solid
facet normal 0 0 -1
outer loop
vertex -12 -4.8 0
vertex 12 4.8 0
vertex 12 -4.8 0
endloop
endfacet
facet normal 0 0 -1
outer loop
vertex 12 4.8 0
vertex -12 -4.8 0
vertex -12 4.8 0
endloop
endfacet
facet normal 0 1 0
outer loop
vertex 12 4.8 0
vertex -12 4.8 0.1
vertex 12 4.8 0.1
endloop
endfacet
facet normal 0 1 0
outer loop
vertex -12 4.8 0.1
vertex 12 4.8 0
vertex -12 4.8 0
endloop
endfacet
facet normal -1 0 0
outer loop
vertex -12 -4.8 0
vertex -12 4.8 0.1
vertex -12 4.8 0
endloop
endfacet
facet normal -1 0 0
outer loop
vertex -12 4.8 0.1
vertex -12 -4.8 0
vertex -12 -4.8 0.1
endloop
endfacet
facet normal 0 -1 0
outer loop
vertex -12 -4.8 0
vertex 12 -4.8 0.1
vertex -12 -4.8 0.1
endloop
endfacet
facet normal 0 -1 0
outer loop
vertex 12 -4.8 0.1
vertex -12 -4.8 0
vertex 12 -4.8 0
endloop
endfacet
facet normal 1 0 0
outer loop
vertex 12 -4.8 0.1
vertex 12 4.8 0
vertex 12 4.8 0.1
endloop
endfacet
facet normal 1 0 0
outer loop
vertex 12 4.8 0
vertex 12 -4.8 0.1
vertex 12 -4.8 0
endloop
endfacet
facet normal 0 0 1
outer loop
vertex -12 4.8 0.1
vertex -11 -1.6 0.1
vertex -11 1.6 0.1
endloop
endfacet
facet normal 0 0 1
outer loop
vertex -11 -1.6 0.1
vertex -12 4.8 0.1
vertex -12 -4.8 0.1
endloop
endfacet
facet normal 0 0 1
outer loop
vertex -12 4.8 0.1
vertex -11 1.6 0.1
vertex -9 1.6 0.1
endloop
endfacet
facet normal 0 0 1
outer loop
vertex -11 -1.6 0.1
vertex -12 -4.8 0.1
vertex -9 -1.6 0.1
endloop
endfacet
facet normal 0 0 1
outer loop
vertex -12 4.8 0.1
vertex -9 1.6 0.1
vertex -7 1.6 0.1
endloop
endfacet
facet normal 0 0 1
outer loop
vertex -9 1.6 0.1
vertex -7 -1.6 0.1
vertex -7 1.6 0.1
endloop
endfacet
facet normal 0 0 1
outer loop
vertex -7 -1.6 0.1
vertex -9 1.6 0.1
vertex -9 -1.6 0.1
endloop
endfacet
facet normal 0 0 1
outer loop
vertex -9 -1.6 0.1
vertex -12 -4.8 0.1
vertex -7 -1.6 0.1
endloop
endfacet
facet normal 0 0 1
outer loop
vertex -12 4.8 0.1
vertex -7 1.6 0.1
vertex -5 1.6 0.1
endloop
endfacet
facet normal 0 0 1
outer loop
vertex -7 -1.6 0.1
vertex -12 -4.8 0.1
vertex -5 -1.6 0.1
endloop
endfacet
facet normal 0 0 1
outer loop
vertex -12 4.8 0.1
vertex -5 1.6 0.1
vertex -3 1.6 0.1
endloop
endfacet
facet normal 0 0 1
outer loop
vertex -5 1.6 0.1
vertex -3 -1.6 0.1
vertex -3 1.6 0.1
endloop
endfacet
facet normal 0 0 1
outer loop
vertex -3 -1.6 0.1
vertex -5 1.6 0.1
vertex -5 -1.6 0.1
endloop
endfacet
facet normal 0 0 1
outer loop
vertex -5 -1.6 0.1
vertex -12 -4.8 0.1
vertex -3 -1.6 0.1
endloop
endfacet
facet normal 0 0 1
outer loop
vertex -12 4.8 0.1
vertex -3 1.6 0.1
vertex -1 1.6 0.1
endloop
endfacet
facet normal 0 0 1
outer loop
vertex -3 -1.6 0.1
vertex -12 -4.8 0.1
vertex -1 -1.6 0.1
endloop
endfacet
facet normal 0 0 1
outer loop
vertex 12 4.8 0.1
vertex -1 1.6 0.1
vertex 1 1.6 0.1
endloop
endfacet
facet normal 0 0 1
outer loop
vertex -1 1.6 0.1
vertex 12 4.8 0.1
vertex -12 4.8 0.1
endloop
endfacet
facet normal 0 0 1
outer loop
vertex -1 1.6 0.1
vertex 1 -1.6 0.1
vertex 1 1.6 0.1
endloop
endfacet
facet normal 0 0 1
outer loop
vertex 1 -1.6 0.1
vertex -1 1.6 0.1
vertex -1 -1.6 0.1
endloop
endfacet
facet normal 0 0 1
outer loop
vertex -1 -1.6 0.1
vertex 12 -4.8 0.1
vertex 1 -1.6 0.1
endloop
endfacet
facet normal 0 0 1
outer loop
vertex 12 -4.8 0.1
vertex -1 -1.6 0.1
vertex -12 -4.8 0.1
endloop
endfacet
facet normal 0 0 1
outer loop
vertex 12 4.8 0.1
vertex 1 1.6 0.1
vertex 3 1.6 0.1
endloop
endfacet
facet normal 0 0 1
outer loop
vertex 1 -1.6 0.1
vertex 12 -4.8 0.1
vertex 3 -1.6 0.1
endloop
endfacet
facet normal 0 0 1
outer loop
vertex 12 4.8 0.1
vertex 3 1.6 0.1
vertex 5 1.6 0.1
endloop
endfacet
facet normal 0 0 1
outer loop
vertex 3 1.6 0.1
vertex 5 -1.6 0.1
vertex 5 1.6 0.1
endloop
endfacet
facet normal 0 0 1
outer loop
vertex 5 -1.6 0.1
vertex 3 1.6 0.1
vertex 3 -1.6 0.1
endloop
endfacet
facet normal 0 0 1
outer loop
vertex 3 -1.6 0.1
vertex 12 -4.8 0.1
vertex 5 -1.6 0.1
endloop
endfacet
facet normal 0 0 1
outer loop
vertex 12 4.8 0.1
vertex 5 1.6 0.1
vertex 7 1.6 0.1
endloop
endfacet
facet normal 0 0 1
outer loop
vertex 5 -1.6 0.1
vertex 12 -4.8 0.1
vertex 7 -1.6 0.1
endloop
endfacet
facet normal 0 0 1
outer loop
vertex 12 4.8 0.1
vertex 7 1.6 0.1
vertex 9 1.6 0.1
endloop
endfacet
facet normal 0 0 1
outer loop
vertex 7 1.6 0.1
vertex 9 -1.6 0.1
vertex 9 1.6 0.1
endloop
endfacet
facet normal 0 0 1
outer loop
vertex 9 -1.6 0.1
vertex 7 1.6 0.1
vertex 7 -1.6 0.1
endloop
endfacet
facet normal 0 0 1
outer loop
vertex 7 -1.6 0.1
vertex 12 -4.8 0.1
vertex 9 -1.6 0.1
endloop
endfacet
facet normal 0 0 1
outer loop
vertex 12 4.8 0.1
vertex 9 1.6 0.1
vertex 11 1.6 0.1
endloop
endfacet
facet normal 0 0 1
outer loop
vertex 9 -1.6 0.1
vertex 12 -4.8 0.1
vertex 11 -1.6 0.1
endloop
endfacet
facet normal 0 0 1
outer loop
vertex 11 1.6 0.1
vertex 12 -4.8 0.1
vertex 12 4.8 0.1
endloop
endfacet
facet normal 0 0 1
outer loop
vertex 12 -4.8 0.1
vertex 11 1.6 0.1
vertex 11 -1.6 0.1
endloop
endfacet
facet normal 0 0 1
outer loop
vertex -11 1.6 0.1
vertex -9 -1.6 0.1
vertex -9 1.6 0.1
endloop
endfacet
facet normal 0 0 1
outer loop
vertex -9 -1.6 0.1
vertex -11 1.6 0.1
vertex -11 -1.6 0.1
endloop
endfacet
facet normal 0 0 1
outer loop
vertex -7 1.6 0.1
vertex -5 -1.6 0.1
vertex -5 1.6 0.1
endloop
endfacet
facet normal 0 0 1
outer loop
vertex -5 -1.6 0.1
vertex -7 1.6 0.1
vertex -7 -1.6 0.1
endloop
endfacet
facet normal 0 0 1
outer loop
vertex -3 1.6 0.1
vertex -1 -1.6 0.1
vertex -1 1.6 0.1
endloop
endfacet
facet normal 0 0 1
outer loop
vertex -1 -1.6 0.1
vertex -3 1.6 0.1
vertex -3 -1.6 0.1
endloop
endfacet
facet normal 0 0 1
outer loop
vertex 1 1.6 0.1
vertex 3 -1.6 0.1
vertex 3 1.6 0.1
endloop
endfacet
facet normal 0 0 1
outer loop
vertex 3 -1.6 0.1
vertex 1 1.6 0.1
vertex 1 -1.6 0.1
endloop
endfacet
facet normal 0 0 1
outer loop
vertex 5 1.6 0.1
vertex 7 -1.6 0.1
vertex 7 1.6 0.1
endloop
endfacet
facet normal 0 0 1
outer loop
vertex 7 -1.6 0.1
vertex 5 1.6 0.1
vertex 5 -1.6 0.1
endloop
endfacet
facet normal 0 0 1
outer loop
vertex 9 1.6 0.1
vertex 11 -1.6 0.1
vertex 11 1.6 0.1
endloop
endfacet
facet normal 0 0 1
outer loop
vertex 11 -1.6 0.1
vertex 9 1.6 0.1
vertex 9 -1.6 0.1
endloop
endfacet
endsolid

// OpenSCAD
// file: ../p/box5-12.scad
use <../lib.scad>
function ldraw_lib__box5_12() = [
// 0 Box with 5 Faces without Any Edges
// 0 Name: box5-12.dat
// 0 Author: Chris Dee [cwdee]
// 0 !LDRAW_ORG Primitive UPDATE 2009-02
// 0 !LICENSE Licensed under CC BY 4.0 : see CAreadme.txt
// 
// 0 BFC CERTIFY CCW
  [0,"BFC","CERTIFY"],
  [0,"BFC","CCW"],
// 
// 0 !HISTORY 2009-09-03 [PTadmin] Official Update 2009-02
// 
// 
// 4 16 1 1 1 1 1 -1 -1 1 -1 -1 1 1
  [4,16,1,1,1,1,1,-1,-1,1,-1,-1,1,1],
// 4 16 -1 0 1 1 0 1 1 1 1 -1 1 1
  [4,16,-1,0,1,1,0,1,1,1,1,-1,1,1],
// 4 16 -1 0 -1 -1 0 1 -1 1 1 -1 1 -1
  [4,16,-1,0,-1,-1,0,1,-1,1,1,-1,1,-1],
// 4 16 1 0 -1 -1 0 -1 -1 1 -1 1 1 -1
  [4,16,1,0,-1,-1,0,-1,-1,1,-1,1,1,-1],
// 4 16 1 0 1 1 0 -1 1 1 -1 1 1 1
  [4,16,1,0,1,1,0,-1,1,1,-1,1,1,1],
// 0
];
module ldraw_lib__box5_12(step=0, col=false, unit=2/5, alt=false, line=0.2, solid=!$preview)
    makepoly(ldraw_lib__box5_12(), step=step, col=col, unit=unit, alt=alt, line=line, solid=solid);
ldraw_lib__box5_12(line=0.2);
// main file
use <../lib.scad>
use <../p/box5-12.scad>
function ldraw_lib__191485o() = [
// 0 Sticker  1.2 x  3.0 with One Centred Row of Light Blue Squares
// 0 Name: 191485o.dat
// 0 Author: Rene Rechthaler [Blechtaler]
// 0 !LDRAW_ORG Part UPDATE 2024-03
// 0 !LICENSE Licensed under CC BY 4.0 : see CAreadme.txt
// 
// 0 BFC CERTIFY CCW
  [0,"BFC","CERTIFY"],
  [0,"BFC","CCW"],
// 
// 0 !KEYWORDS Bricklink 1554stk01, Brickowl 356438, ferry, Finland Steamship Co.
// 0 !KEYWORDS Rebrickable 191485, Set 1554, Silja
// 
// 0 !HISTORY 2023-10-21 [Blechtaler] fixed some t-junk and used MagFors color 0x237A1E8
// 0 !HISTORY 2024-04-01 [MagFors] Added a noclip
// 0 !HISTORY 2024-04-28 [OrionP] Official Update 2024-03
// 
// 1 16 0 -.25 0 30 0 0 0 .25 0 0 0 12 box5-12.dat
  [1,16,0,-.25,0,30,0,0,0,.25,0,0,0,12, ldraw_lib__box5_12()],
// 
// 4 16 -30 -.25 12 -30 -.25 -12 -27.5 -.25 -4 -27.5 -.25 4
  [4,16,-30,-.25,12,-30,-.25,-12,-27.5,-.25,-4,-27.5,-.25,4],
// 3 16 -30 -.25 12 -27.5 -.25 4 -22.5 -.25 4
  [3,16,-30,-.25,12,-27.5,-.25,4,-22.5,-.25,4],
// 3 16 -27.5 -.25 -4 -30 -.25 -12 -22.5 -.25 -4
  [3,16,-27.5,-.25,-4,-30,-.25,-12,-22.5,-.25,-4],
// 3 16 -30 -.25 12 -22.5 -.25 4 -17.5 -.25 4
  [3,16,-30,-.25,12,-22.5,-.25,4,-17.5,-.25,4],
// 4 16 -22.5 -.25 4 -22.5 -.25 -4 -17.5 -.25 -4 -17.5 -.25 4
  [4,16,-22.5,-.25,4,-22.5,-.25,-4,-17.5,-.25,-4,-17.5,-.25,4],
// 3 16 -22.5 -.25 -4 -30 -.25 -12 -17.5 -.25 -4
  [3,16,-22.5,-.25,-4,-30,-.25,-12,-17.5,-.25,-4],
// 3 16 -30 -.25 12 -17.5 -.25 4 -12.5 -.25 4
  [3,16,-30,-.25,12,-17.5,-.25,4,-12.5,-.25,4],
// 3 16 -17.5 -.25 -4 -30 -.25 -12 -12.5 -.25 -4
  [3,16,-17.5,-.25,-4,-30,-.25,-12,-12.5,-.25,-4],
// 3 16 -30 -.25 12 -12.5 -.25 4 -7.5 -.25 4
  [3,16,-30,-.25,12,-12.5,-.25,4,-7.5,-.25,4],
// 4 16 -12.5 -.25 4 -12.5 -.25 -4 -7.5 -.25 -4 -7.5 -.25 4
  [4,16,-12.5,-.25,4,-12.5,-.25,-4,-7.5,-.25,-4,-7.5,-.25,4],
// 3 16 -12.5 -.25 -4 -30 -.25 -12 -7.5 -.25 -4
  [3,16,-12.5,-.25,-4,-30,-.25,-12,-7.5,-.25,-4],
// 3 16 -30 -.25 12 -7.5 -.25 4 -2.5 -.25 4
  [3,16,-30,-.25,12,-7.5,-.25,4,-2.5,-.25,4],
// 3 16 -7.5 -.25 -4 -30 -.25 -12 -2.5 -.25 -4
  [3,16,-7.5,-.25,-4,-30,-.25,-12,-2.5,-.25,-4],
// 4 16 -30 -.25 12 -2.5 -.25 4 2.5 -.25 4 30 -.25 12
  [4,16,-30,-.25,12,-2.5,-.25,4,2.5,-.25,4,30,-.25,12],
// 4 16 -2.5 -.25 4 -2.5 -.25 -4 2.5 -.25 -4 2.5 -.25 4
  [4,16,-2.5,-.25,4,-2.5,-.25,-4,2.5,-.25,-4,2.5,-.25,4],
// 4 16 -2.5 -.25 -4 -30 -.25 -12 30 -.25 -12 2.5 -.25 -4
  [4,16,-2.5,-.25,-4,-30,-.25,-12,30,-.25,-12,2.5,-.25,-4],
// 3 16 30 -.25 12 2.5 -.25 4 7.5 -.25 4
  [3,16,30,-.25,12,2.5,-.25,4,7.5,-.25,4],
// 3 16 2.5 -.25 -4 30 -.25 -12 7.5 -.25 -4
  [3,16,2.5,-.25,-4,30,-.25,-12,7.5,-.25,-4],
// 3 16 30 -.25 12 7.5 -.25 4 12.5 -.25 4
  [3,16,30,-.25,12,7.5,-.25,4,12.5,-.25,4],
// 4 16 7.5 -.25 4 7.5 -.25 -4 12.5 -.25 -4 12.5 -.25 4
  [4,16,7.5,-.25,4,7.5,-.25,-4,12.5,-.25,-4,12.5,-.25,4],
// 3 16 7.5 -.25 -4 30 -.25 -12 12.5 -.25 -4
  [3,16,7.5,-.25,-4,30,-.25,-12,12.5,-.25,-4],
// 3 16 30 -.25 12 12.5 -.25 4 17.5 -.25 4
  [3,16,30,-.25,12,12.5,-.25,4,17.5,-.25,4],
// 3 16 12.5 -.25 -4 30 -.25 -12 17.5 -.25 -4
  [3,16,12.5,-.25,-4,30,-.25,-12,17.5,-.25,-4],
// 3 16 30 -.25 12 17.5 -.25 4 22.5 -.25 4
  [3,16,30,-.25,12,17.5,-.25,4,22.5,-.25,4],
// 4 16 17.5 -.25 4 17.5 -.25 -4 22.5 -.25 -4 22.5 -.25 4
  [4,16,17.5,-.25,4,17.5,-.25,-4,22.5,-.25,-4,22.5,-.25,4],
// 3 16 17.5 -.25 -4 30 -.25 -12 22.5 -.25 -4
  [3,16,17.5,-.25,-4,30,-.25,-12,22.5,-.25,-4],
// 3 16 30 -.25 12 22.5 -.25 4 27.5 -.25 4
  [3,16,30,-.25,12,22.5,-.25,4,27.5,-.25,4],
// 3 16 22.5 -.25 -4 30 -.25 -12 27.5 -.25 -4
  [3,16,22.5,-.25,-4,30,-.25,-12,27.5,-.25,-4],
// 4 16 27.5 -.25 4 27.5 -.25 -4 30 -.25 -12 30 -.25 12
  [4,16,27.5,-.25,4,27.5,-.25,-4,30,-.25,-12,30,-.25,12],
// 0 BFC NOCLIP
  [0,"BFC","NOCLIP"],
// 4 0x237A1E8 -27.5 -.25 4 -27.5 -.25 -4 -22.5 -.25 -4 -22.5 -.25 4
  [4,37200360,-27.5,-.25,4,-27.5,-.25,-4,-22.5,-.25,-4,-22.5,-.25,4],
// 4 0x237A1E8 -17.5 -.25 4 -17.5 -.25 -4 -12.5 -.25 -4 -12.5 -.25 4
  [4,37200360,-17.5,-.25,4,-17.5,-.25,-4,-12.5,-.25,-4,-12.5,-.25,4],
// 4 0x237A1E8 -7.5 -.25 4 -7.5 -.25 -4 -2.5 -.25 -4 -2.5 -.25 4
  [4,37200360,-7.5,-.25,4,-7.5,-.25,-4,-2.5,-.25,-4,-2.5,-.25,4],
// 4 0x237A1E8 2.5 -.25 4 2.5 -.25 -4 7.5 -.25 -4 7.5 -.25 4
  [4,37200360,2.5,-.25,4,2.5,-.25,-4,7.5,-.25,-4,7.5,-.25,4],
// 4 0x237A1E8 12.5 -.25 4 12.5 -.25 -4 17.5 -.25 -4 17.5 -.25 4
  [4,37200360,12.5,-.25,4,12.5,-.25,-4,17.5,-.25,-4,17.5,-.25,4],
// 4 0x237A1E8 22.5 -.25 4 22.5 -.25 -4 27.5 -.25 -4 27.5 -.25 4
  [4,37200360,22.5,-.25,4,22.5,-.25,-4,27.5,-.25,-4,27.5,-.25,4],
];
module ldraw_lib__191485o(step=0, col=false, unit=2/5, alt=false, line=0.2, solid=!$preview)
    makepoly(ldraw_lib__191485o(), step=step, col=col, unit=unit, alt=alt, line=line, solid=solid);
ldraw_lib__191485o(line=0.2);
